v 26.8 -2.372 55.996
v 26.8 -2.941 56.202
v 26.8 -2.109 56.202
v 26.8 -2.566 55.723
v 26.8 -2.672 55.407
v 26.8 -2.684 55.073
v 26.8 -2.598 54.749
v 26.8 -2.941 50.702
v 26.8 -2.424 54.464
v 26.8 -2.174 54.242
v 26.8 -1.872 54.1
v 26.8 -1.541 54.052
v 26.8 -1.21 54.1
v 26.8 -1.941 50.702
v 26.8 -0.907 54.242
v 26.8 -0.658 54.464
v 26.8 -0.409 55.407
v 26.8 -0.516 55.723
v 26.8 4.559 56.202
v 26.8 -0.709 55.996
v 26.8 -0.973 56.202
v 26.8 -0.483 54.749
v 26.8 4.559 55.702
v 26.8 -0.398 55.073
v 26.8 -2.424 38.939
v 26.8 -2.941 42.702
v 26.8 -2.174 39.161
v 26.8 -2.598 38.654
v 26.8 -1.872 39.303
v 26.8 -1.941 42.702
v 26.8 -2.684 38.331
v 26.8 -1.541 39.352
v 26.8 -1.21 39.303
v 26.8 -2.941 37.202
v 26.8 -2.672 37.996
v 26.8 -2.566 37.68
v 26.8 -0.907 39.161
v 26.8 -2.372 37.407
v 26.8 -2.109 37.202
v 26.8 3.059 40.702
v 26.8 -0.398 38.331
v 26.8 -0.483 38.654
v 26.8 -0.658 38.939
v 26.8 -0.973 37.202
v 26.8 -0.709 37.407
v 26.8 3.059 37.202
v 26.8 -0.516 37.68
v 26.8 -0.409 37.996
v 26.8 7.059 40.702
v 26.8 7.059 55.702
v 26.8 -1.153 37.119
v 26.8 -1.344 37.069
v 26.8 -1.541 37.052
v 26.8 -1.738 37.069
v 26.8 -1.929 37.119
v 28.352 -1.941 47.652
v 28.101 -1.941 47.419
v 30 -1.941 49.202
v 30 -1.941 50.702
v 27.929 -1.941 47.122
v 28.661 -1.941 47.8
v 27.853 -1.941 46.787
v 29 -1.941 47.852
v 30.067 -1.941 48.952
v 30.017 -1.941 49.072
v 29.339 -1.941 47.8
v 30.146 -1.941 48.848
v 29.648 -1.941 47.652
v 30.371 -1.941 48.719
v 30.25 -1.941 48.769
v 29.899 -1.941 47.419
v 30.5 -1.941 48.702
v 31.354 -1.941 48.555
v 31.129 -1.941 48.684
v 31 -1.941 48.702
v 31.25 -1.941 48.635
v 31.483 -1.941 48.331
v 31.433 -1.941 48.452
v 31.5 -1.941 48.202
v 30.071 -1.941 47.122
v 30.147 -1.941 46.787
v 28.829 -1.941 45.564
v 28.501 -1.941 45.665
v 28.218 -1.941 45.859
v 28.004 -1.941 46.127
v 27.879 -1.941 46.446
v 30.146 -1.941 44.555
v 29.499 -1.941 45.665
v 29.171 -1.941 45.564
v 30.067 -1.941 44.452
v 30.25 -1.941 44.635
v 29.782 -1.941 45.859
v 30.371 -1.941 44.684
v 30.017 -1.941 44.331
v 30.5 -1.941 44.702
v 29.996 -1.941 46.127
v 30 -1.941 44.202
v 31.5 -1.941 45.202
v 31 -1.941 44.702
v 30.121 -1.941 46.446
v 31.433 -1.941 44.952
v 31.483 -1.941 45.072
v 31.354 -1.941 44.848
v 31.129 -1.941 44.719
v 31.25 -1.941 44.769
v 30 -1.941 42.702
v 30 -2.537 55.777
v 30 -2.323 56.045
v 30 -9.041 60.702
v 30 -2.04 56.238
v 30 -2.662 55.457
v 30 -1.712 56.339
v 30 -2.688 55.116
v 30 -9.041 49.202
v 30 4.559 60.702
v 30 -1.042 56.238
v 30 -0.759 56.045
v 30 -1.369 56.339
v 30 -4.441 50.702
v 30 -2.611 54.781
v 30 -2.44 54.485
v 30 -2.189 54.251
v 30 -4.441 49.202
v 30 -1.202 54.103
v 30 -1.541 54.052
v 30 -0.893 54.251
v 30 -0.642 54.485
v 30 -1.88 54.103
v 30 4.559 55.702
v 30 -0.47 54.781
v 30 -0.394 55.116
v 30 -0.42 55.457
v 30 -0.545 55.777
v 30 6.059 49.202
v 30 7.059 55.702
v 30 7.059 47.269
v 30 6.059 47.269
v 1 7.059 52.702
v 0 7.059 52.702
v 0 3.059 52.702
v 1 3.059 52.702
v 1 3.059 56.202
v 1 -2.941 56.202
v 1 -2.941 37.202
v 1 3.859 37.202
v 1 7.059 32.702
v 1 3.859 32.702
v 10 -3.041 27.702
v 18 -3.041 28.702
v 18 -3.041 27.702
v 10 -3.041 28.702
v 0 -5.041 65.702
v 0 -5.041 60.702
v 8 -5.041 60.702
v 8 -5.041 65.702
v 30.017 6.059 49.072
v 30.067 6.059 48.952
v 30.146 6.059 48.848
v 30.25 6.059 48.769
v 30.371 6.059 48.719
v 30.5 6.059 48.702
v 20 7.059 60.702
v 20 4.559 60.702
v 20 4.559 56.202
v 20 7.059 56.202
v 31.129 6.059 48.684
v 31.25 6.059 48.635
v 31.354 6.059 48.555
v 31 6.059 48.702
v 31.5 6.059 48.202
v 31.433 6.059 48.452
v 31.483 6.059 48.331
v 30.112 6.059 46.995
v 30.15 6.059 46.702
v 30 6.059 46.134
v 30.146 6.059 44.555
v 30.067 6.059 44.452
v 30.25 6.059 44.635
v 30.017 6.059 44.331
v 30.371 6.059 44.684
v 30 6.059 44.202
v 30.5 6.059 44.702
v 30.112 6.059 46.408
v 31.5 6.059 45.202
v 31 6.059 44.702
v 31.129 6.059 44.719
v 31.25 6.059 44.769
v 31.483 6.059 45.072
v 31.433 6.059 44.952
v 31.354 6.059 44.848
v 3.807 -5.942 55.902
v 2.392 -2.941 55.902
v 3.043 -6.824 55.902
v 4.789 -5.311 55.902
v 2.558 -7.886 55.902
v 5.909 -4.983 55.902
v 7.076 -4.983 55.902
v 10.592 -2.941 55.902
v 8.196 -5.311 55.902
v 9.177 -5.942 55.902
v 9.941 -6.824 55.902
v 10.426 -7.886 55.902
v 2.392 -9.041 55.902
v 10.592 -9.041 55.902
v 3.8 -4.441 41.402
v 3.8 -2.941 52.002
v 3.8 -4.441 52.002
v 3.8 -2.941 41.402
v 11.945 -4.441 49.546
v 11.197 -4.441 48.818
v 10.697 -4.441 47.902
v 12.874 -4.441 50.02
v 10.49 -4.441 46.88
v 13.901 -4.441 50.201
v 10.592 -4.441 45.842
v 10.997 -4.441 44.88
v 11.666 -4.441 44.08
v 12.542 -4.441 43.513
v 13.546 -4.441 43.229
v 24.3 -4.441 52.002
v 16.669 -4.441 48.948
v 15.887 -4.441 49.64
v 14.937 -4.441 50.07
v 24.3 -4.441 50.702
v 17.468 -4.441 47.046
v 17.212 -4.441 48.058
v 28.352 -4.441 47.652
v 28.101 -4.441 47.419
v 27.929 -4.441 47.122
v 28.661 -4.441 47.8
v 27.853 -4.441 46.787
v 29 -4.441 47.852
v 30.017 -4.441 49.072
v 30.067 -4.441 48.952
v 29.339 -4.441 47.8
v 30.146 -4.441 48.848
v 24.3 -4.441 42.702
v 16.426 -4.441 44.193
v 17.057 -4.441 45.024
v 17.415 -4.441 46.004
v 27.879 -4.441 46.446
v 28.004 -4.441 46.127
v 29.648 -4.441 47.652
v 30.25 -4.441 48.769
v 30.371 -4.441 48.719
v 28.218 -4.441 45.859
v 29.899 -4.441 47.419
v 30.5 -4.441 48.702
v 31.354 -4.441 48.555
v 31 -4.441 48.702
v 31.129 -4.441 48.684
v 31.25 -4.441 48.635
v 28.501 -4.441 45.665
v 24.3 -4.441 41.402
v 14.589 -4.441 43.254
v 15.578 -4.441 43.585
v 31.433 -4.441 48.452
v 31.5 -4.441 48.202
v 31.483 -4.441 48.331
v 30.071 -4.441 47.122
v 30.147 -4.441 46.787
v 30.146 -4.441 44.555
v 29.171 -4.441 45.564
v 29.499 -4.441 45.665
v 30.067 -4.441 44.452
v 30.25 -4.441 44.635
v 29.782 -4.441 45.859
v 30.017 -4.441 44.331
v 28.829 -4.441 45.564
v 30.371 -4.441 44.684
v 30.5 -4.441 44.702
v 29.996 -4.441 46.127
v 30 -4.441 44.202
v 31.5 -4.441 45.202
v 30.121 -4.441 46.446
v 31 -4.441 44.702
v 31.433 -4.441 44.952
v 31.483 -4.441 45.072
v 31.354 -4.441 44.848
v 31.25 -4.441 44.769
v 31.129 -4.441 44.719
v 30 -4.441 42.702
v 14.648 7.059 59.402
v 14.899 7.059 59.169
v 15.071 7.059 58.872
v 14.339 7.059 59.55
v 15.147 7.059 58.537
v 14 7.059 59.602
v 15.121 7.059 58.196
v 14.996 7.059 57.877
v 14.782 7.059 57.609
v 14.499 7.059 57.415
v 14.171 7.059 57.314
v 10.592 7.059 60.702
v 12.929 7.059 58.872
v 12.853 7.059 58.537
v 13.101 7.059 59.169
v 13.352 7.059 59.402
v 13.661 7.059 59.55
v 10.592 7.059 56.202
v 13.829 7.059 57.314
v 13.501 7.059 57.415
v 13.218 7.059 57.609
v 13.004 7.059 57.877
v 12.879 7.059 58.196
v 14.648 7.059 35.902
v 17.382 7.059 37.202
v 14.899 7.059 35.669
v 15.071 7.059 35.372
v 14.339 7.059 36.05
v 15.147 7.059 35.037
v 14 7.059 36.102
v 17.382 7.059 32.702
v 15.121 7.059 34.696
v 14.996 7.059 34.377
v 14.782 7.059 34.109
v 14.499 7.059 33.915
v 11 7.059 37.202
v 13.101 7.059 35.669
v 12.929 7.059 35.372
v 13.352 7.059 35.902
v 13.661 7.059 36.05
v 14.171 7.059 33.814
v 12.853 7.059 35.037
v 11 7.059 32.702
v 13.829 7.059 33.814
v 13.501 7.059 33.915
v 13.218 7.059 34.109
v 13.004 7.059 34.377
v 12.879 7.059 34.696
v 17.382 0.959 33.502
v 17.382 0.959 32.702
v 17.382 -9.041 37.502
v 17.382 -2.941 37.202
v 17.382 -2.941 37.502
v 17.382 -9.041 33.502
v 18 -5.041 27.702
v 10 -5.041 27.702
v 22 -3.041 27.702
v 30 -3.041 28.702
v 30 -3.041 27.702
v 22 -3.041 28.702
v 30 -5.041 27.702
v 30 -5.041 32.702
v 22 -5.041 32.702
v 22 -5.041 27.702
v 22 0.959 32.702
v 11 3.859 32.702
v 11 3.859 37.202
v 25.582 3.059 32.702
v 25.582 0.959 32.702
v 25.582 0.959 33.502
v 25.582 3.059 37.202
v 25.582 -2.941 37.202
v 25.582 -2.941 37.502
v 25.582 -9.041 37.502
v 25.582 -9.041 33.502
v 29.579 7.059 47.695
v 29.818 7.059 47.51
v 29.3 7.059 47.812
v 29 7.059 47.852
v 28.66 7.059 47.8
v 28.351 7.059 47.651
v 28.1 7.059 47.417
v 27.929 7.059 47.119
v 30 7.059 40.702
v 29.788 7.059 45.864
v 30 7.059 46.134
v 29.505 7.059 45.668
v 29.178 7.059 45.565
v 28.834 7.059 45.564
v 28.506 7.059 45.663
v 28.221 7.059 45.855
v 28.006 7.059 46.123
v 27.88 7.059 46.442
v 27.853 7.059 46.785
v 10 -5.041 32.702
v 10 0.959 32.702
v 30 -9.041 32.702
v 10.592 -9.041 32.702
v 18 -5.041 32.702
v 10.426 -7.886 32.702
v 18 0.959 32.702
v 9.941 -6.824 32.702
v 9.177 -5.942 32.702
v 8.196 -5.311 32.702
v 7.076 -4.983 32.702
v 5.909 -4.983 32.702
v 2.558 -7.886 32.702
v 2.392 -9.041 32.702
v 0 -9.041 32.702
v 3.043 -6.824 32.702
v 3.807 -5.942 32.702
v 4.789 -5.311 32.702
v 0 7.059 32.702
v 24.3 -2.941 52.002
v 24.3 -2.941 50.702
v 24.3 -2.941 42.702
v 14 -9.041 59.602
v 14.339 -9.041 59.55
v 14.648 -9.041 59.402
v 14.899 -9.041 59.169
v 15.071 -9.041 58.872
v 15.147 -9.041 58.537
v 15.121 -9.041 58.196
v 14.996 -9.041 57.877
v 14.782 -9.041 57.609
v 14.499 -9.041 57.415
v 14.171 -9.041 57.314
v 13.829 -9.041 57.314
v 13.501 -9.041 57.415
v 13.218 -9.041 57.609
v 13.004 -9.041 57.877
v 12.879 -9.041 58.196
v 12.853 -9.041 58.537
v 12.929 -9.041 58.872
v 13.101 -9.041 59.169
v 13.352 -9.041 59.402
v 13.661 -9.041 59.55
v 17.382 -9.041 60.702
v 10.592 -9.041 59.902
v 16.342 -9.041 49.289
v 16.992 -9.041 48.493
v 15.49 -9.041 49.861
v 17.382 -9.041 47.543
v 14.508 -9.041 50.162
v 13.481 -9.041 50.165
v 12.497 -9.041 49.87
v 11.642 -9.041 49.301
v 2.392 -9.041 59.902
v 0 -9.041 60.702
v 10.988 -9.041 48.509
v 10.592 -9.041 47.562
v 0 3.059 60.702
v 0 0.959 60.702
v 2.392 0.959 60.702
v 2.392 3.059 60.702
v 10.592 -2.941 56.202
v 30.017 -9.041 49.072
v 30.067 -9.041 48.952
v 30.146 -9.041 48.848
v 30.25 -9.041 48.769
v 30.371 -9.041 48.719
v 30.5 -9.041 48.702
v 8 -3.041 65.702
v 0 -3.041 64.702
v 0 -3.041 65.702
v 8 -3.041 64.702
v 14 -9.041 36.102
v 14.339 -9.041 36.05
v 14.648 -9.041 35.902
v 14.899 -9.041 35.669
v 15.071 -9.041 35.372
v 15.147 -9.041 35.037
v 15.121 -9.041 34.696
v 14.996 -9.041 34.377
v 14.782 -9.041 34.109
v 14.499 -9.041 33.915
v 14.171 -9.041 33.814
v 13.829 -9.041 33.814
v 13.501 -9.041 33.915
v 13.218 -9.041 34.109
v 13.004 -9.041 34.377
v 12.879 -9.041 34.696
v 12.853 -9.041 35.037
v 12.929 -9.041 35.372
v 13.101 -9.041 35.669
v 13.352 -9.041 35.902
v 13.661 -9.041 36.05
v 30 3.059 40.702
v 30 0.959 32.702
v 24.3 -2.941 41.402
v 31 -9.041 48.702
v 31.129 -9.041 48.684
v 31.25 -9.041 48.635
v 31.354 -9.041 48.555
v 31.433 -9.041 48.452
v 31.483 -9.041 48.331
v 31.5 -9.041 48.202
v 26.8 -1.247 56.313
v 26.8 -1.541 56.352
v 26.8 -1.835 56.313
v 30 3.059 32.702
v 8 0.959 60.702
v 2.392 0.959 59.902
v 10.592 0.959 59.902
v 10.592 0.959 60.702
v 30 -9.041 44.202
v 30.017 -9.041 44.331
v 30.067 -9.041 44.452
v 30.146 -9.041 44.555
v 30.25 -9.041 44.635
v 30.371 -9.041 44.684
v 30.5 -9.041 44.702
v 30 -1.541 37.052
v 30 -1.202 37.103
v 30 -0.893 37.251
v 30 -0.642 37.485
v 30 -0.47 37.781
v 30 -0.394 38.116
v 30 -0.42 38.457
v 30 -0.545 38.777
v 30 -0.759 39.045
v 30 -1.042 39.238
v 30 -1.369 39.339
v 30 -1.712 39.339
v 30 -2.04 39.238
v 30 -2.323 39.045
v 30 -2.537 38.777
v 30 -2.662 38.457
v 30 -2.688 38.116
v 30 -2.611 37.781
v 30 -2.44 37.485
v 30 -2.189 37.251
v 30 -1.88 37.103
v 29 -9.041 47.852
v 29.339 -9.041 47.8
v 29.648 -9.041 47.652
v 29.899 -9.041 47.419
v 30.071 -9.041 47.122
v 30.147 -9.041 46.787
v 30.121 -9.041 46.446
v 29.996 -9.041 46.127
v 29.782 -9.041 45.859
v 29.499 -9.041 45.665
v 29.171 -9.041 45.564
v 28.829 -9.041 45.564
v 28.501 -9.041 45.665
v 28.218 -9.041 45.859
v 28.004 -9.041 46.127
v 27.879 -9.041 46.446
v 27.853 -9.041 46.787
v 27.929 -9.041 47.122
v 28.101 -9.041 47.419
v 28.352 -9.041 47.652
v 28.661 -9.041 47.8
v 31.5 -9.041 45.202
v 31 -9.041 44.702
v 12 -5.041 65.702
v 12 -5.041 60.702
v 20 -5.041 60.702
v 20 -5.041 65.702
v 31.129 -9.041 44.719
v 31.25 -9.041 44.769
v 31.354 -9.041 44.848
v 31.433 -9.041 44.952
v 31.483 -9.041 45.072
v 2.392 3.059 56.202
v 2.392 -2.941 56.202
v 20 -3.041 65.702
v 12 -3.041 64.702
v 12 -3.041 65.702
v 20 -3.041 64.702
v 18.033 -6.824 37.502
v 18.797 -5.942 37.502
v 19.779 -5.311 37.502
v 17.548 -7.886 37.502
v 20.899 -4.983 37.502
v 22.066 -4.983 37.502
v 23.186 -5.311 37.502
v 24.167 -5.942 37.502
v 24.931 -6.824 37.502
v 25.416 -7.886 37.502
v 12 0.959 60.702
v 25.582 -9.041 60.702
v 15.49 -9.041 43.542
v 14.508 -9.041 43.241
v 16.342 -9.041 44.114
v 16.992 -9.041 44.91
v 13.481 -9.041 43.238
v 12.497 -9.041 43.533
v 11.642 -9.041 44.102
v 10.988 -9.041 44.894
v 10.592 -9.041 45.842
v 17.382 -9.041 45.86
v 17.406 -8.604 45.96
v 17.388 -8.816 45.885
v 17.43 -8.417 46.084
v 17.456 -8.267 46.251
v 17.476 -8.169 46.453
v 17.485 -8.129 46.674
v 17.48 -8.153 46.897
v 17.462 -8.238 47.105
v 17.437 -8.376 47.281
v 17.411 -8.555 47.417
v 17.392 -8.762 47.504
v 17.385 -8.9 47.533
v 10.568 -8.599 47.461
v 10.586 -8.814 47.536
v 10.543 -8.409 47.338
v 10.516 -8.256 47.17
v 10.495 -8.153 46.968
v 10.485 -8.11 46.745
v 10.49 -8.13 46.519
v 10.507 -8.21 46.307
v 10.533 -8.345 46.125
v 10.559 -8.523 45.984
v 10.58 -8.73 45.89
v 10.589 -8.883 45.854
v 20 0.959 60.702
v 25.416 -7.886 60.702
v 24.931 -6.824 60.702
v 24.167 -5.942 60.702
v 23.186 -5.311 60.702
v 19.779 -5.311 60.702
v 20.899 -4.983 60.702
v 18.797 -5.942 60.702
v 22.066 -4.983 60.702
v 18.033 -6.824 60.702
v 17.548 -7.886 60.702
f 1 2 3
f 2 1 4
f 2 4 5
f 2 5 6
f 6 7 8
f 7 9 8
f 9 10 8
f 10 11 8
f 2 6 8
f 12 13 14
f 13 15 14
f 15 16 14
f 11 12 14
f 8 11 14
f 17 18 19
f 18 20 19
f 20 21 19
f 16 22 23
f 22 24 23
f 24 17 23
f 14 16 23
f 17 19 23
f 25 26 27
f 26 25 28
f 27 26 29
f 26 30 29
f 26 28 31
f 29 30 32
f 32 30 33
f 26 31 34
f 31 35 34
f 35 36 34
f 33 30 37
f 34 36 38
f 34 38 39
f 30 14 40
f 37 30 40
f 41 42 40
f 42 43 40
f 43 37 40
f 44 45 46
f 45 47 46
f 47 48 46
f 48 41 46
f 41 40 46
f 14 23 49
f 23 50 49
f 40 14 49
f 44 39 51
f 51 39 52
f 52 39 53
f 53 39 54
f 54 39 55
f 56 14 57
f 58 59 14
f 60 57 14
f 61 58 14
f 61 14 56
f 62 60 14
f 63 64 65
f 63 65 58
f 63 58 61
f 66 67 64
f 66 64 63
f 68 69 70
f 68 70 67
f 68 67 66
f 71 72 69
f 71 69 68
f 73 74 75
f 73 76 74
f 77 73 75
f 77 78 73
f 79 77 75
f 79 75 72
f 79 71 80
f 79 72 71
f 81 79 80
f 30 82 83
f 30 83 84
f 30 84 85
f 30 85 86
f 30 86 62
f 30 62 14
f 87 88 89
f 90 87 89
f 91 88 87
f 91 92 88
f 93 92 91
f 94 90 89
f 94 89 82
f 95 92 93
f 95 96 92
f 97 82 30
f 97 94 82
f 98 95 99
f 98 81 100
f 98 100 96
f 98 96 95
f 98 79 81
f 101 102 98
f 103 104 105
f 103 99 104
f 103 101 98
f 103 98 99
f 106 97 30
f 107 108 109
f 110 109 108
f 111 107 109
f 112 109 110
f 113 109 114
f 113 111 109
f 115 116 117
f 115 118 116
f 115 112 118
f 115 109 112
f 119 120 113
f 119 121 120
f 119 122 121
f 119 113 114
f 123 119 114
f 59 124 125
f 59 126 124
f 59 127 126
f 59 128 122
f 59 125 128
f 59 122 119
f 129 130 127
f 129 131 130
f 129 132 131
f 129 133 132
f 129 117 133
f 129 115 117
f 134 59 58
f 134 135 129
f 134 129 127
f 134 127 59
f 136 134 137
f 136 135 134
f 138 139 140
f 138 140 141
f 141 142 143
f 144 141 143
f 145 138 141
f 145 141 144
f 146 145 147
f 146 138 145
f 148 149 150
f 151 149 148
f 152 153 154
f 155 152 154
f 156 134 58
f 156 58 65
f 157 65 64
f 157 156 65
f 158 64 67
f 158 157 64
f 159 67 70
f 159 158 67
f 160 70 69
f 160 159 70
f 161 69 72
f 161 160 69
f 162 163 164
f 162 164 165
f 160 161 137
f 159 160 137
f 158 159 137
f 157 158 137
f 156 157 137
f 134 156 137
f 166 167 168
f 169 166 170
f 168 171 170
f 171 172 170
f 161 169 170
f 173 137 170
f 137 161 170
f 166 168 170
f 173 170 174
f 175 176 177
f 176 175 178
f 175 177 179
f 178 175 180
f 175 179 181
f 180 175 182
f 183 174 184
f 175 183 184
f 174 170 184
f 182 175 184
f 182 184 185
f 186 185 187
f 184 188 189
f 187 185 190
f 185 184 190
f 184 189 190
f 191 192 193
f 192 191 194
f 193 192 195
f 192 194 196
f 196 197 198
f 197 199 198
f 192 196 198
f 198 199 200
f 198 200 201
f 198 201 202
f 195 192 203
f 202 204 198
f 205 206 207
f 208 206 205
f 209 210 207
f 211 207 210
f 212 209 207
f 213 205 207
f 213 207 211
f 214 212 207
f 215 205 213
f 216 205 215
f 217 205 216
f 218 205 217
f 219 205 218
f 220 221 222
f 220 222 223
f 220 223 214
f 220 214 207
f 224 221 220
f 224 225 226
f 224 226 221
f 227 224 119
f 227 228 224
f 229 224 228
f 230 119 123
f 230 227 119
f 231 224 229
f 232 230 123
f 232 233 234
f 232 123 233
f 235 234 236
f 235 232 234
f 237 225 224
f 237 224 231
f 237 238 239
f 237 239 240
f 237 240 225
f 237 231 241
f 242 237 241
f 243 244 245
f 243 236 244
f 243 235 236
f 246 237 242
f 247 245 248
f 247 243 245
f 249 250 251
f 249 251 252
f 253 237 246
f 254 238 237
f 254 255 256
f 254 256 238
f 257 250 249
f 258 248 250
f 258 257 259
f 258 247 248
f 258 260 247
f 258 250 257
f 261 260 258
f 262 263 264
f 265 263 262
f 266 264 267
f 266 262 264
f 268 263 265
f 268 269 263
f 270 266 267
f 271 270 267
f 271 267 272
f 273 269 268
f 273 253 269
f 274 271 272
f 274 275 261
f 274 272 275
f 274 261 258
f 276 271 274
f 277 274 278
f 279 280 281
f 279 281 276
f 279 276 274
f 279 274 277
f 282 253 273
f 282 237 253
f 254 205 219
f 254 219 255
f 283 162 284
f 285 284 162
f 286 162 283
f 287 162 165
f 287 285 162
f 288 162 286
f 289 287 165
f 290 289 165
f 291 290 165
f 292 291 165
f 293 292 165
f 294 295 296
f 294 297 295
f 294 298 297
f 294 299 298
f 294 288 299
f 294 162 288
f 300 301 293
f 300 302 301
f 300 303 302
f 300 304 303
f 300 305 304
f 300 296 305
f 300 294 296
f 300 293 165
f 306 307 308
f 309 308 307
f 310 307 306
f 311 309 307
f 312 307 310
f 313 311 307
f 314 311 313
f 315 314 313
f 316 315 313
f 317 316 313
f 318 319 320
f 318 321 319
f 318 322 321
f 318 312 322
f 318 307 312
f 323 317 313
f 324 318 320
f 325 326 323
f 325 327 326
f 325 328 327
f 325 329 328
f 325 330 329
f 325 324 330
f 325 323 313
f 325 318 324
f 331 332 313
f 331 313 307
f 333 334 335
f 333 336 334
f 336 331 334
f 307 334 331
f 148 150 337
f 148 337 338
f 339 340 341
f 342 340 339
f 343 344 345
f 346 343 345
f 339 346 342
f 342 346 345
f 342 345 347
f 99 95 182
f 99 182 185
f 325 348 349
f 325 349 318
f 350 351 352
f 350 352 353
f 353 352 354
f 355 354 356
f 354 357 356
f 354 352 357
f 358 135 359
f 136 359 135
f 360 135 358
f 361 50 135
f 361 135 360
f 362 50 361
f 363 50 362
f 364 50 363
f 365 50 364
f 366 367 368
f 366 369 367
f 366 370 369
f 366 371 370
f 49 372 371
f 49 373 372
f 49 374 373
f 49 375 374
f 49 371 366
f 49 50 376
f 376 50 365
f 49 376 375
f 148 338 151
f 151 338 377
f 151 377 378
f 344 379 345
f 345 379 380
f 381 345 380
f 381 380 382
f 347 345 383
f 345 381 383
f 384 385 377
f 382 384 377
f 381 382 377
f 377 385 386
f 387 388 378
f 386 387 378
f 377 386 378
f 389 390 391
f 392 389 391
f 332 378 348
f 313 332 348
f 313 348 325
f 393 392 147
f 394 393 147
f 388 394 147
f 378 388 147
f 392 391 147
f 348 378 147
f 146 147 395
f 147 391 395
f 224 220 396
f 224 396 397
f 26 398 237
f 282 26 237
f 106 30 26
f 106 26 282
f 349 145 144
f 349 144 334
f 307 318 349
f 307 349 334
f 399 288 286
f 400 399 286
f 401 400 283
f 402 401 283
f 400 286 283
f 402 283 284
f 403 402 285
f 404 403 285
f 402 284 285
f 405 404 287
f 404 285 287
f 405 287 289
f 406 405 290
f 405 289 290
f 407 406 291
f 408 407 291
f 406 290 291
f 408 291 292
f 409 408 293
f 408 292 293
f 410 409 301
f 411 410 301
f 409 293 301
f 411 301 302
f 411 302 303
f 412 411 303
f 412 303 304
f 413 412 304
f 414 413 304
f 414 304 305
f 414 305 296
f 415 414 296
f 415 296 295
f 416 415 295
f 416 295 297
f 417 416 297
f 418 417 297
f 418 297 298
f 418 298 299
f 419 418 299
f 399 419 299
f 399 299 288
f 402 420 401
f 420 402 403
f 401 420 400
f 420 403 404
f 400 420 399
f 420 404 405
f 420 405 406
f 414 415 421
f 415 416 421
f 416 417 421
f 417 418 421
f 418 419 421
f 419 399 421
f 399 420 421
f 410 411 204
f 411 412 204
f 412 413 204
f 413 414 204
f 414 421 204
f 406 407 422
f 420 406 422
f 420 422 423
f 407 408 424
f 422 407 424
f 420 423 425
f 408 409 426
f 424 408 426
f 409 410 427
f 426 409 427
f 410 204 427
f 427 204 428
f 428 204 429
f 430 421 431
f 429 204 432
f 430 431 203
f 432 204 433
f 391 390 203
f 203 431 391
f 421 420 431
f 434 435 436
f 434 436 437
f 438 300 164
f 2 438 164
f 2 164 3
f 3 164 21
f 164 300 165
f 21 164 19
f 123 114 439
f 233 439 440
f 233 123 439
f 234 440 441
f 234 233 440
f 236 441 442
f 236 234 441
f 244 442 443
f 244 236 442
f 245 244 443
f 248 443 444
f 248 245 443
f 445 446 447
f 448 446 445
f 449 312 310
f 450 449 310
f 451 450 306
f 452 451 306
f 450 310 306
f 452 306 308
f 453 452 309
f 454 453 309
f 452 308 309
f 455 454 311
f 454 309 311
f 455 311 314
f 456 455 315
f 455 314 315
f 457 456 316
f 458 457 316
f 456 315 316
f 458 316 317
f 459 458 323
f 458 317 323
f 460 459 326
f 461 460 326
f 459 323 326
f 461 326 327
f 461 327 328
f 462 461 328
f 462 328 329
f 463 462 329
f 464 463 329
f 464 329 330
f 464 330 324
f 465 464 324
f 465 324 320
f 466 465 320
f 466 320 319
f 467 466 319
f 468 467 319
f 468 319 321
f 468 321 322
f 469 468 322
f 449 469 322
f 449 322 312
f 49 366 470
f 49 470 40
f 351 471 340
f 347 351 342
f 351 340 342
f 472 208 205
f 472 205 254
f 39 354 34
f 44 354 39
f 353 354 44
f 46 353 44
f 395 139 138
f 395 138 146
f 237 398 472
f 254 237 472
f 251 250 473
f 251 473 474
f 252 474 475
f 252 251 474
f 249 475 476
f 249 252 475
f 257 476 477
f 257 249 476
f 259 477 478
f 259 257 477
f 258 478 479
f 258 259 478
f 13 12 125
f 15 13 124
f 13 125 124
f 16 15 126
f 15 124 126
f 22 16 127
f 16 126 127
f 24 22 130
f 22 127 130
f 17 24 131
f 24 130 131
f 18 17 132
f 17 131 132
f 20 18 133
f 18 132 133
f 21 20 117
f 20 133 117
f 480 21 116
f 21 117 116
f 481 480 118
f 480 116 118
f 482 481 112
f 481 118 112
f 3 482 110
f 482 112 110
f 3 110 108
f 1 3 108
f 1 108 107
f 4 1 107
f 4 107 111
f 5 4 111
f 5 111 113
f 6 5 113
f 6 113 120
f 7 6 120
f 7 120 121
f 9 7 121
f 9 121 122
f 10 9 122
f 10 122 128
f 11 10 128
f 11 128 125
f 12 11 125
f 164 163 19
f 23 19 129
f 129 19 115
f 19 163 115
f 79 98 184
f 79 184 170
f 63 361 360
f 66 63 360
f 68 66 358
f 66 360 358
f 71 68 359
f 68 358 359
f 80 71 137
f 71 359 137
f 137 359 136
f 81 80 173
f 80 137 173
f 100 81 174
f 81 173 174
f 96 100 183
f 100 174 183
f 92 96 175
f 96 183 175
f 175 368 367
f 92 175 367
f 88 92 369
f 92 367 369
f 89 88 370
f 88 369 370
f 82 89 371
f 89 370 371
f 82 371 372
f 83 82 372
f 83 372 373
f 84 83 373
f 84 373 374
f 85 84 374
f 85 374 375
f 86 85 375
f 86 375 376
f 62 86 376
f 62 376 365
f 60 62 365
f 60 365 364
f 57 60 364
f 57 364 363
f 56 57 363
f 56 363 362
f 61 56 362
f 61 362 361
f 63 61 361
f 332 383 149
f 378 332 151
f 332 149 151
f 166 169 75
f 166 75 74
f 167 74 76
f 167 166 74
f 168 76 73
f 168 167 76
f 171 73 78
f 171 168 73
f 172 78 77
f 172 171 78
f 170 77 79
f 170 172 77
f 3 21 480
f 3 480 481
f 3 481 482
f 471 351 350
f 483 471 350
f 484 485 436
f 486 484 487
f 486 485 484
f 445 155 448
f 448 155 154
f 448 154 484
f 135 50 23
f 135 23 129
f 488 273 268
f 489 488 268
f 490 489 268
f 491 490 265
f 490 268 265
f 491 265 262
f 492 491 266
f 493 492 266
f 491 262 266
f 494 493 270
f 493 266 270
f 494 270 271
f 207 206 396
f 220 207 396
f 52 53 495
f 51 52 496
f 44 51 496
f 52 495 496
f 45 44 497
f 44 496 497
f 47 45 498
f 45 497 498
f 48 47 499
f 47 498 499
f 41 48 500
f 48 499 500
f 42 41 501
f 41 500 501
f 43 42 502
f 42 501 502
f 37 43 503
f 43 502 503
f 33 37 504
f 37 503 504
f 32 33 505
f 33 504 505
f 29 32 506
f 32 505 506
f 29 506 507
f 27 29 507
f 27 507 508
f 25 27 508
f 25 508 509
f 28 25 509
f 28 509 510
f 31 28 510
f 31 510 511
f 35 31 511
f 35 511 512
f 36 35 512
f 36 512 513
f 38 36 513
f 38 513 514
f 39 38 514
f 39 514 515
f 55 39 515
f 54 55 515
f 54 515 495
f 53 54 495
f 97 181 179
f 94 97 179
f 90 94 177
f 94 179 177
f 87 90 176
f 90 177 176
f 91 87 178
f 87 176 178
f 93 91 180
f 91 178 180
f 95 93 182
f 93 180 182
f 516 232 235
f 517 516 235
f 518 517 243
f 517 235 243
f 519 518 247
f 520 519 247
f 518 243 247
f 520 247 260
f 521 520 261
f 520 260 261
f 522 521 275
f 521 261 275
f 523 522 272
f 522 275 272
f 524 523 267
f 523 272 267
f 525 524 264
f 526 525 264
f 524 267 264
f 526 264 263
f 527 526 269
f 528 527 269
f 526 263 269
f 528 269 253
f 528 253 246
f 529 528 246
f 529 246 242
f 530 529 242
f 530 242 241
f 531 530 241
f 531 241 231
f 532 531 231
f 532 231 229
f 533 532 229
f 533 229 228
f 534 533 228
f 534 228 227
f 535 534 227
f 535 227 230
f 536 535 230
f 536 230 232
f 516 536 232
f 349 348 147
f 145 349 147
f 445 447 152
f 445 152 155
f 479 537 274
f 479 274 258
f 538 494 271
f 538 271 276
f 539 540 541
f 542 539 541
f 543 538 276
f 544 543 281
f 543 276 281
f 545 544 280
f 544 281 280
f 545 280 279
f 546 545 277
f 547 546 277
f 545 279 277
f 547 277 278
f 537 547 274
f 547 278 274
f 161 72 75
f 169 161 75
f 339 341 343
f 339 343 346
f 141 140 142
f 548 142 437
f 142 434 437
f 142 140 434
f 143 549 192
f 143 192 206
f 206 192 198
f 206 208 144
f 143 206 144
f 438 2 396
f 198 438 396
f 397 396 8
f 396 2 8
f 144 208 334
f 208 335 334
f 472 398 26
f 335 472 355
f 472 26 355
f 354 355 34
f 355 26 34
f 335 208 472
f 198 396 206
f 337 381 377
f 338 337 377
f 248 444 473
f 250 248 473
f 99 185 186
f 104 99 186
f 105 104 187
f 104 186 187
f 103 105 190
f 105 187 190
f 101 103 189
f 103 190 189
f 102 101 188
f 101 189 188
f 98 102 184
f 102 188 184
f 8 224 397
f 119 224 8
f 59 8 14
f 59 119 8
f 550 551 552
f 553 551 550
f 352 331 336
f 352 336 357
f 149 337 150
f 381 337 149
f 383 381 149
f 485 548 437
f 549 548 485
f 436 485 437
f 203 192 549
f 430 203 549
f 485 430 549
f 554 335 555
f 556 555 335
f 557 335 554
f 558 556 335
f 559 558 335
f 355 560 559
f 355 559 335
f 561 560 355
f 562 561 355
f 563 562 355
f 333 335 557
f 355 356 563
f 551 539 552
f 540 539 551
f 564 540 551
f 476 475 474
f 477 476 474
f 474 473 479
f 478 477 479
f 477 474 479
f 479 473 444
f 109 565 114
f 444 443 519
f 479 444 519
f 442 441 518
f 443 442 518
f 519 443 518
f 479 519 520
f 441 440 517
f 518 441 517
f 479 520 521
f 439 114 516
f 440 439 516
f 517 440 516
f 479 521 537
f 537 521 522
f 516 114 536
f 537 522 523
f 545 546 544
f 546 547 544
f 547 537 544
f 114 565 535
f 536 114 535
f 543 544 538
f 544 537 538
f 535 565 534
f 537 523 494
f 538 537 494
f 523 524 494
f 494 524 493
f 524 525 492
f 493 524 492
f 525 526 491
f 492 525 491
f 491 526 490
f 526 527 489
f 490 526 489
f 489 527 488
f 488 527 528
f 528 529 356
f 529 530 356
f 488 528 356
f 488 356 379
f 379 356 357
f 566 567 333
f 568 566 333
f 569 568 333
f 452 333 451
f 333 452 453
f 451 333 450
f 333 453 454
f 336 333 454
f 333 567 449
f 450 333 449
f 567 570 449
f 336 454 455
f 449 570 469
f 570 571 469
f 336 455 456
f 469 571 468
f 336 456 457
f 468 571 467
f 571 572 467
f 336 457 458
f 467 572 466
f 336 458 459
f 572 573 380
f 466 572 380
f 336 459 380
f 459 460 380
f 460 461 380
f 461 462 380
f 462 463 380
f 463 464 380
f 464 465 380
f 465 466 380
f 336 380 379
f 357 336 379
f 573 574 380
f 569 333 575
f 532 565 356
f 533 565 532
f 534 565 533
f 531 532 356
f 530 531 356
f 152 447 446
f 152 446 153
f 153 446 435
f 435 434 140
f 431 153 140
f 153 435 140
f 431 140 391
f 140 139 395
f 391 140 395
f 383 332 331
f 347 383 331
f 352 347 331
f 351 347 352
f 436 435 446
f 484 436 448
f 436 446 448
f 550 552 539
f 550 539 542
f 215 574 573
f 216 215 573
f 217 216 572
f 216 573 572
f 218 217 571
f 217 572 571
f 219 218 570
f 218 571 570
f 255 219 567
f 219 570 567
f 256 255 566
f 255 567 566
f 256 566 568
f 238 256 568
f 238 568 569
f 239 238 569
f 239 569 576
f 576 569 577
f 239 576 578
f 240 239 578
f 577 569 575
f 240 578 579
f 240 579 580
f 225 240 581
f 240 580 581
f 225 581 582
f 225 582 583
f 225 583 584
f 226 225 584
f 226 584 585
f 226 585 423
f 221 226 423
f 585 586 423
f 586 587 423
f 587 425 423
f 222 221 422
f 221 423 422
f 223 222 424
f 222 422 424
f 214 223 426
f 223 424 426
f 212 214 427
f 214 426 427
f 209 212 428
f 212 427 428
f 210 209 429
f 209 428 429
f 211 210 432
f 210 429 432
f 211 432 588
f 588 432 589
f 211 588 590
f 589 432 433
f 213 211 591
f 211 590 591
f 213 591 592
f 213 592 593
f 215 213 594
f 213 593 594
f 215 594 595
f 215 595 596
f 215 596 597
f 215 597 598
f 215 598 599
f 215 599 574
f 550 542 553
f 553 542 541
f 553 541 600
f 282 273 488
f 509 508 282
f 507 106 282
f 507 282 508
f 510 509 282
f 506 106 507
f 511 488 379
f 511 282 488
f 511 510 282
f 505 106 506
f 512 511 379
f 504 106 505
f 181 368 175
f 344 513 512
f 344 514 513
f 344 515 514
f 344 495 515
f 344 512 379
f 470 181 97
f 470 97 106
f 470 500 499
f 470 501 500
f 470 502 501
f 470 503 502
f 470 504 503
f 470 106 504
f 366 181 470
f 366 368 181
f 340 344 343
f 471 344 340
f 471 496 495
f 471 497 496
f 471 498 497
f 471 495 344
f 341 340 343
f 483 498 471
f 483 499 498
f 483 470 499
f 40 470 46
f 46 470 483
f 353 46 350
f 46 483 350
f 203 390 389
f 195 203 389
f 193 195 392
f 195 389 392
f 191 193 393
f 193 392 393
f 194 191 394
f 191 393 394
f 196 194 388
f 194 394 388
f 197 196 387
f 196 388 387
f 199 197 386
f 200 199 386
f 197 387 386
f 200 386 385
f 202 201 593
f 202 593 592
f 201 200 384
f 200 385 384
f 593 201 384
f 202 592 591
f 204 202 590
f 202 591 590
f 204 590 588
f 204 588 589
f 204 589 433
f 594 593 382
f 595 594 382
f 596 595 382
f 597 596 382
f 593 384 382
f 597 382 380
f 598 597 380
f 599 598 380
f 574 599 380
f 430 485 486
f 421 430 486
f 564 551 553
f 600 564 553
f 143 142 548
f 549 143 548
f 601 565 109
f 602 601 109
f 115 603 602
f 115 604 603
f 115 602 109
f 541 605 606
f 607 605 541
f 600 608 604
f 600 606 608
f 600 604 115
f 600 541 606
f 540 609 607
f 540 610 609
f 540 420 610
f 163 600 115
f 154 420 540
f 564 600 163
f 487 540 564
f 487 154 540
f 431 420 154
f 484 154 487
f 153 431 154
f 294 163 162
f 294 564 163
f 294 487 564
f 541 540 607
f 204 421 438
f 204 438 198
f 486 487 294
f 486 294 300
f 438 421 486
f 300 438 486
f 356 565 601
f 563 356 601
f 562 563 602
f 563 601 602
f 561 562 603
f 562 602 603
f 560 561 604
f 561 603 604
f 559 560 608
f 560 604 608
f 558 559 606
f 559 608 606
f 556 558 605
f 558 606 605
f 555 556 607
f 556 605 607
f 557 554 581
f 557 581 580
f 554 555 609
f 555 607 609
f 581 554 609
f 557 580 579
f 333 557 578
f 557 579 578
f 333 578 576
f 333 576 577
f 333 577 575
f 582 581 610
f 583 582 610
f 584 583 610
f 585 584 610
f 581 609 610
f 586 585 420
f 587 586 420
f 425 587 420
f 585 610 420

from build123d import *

# Parameters (mm, degrees)
SKETCH1_W           = 28
SKETCH1_H           = 16.1
BOSS_EXTRUDE1_DEPTH = 30
SKETCH2_W           = 10
SKETCH2_H           = 2.5
CUT_EXTRUDE1_DEPTH  = 5
SKETCH3_W           = 10
SKETCH3_H           = 4
CUT_EXTRUDE2_DEPTH  = 8
SKETCH4_W           = 10
SKETCH4_H           = 3.2
CUT_EXTRUDE3_DEPTH  = 8
SKETCH5_W           = 11
SKETCH5_H           = 4
CUT_EXTRUDE4_DEPTH  = 8
SKETCH6_W           = 20
SKETCH6_H           = 2
BOSS_EXTRUDE2_DEPTH = 5
CHAMFER1_SIZE       = 4
SKETCH7_W           = 20
SKETCH7_H           = 2
BOSS_EXTRUDE3_DEPTH = 5
CHAMFER2_SIZE       = 4
SKETCH9_W           = 25.8
SKETCH9_H           = 19
CUT_EXTRUDE6_DEPTH  = 10
SKETCH13_R          = 4.1
CUT_EXTRUDE10_DEPTH = 27.2
SKETCH14_R          = 4.1
CUT_EXTRUDE11_DEPTH = 27.2
SKETCH15_W          = 8.2
SKETCH15_H          = 4
CUT_EXTRUDE12_DEPTH = 27.2
SKETCH16_W          = 0.59230819
SKETCH16_H          = 0.8
SKETCH16_W_2        = 1.617695922
CUT_EXTRUDE13_DEPTH = 4
SKETCH17_W          = 1.5
SKETCH17_H          = 4
BOSS_EXTRUDE4_DEPTH = 16.1
FILLET1_R           = 0.5
SKETCH18_R          = 3.5
CUT_EXTRUDE14_DEPTH = 6.1
SKETCH19_W          = 8
SKETCH19_H          = 1
CUT_EXTRUDE15_DEPTH = 10
SKETCH20_W          = 20.5
SKETCH20_H          = 10.6
CUT_EXTRUDE16_DEPTH = 1.5
SKETCH21_W          = 5.7
SKETCH21_H          = 8
CUT_EXTRUDE17_DEPTH = 1.5
SKETCH22_W          = 8
SKETCH22_H          = 2.5
CUT_EXTRUDE18_DEPTH = 1.5
SKETCH23_R          = 1.15
CUT_EXTRUDE19_DEPTH = 75.620049118
SKETCH24_W          = 8.2
SKETCH24_H          = 0.8
CUT_EXTRUDE20_DEPTH = 2.1
CUT_EXTRUDE21_REACH = 75.421
SKETCH25_W          = 7.929527271
SKETCH25_H          = 1
CUT_EXTRUDE22_START = -5
SKETCH26_W          = 4
SKETCH26_H          = 6
CUT_EXTRUDE22_DEPTH = 5
CUT_EXTRUDE23_START = -5
SKETCH27_W          = 4
SKETCH27_H          = 6
CUT_EXTRUDE23_DEPTH = 5
SKETCH28_R          = 1.15
CUT_EXTRUDE24_DEPTH = 3.2


with BuildPart() as part:
    # Sketch1 → Boss-Extrude1 (new body)
    with BuildSketch(Plane(origin=(0, 0, 0), x_dir=(0, 0, -1), z_dir=(1, 0, 0))):
        with Locations((-46.701535197, -0.990821865)):
            Rectangle(SKETCH1_W, SKETCH1_H)
    extrude(amount=BOSS_EXTRUDE1_DEPTH)

    # Sketch2 → Cut-Extrude1 (cut)
    with BuildSketch(Plane.XY.offset(60.701535197)):
        with Locations((25, 5.809178135)):
            Rectangle(SKETCH2_W, SKETCH2_H)
    extrude(amount=-CUT_EXTRUDE1_DEPTH, mode=Mode.SUBTRACT)

    # Sketch3 → Cut-Extrude2 (cut)
    with BuildSketch(Plane.XY.offset(60.701535197)):
        with Locations((5, 5.059178135)):
            Rectangle(SKETCH3_W, SKETCH3_H)
    extrude(amount=-CUT_EXTRUDE2_DEPTH, mode=Mode.SUBTRACT)

    # Sketch4 → Cut-Extrude3 (cut)
    with BuildSketch(Plane(origin=(0, 0, 32.701535197), x_dir=(-1, 0, 0), z_dir=(0, 0, -1))):
        with Locations((-6, 5.459178135)):
            Rectangle(SKETCH4_W, SKETCH4_H)
    extrude(amount=-CUT_EXTRUDE3_DEPTH, mode=Mode.SUBTRACT)

    # Sketch5 → Cut-Extrude4 (cut)
    with BuildSketch(Plane(origin=(0, 0, 32.701535197), x_dir=(-1, 0, 0), z_dir=(0, 0, -1))):
        with Locations((-24.5, 5.059178135)):
            Rectangle(SKETCH5_W, SKETCH5_H)
    extrude(amount=-CUT_EXTRUDE4_DEPTH, mode=Mode.SUBTRACT)

    # Sketch6 → Boss-Extrude2 (add)
    with BuildSketch(Plane(origin=(0, 0, 32.701535197), x_dir=(-1, 0, 0), z_dir=(0, 0, -1))):
        with Locations((-20, -4.040821865)):
            Rectangle(SKETCH6_W, SKETCH6_H)
    extrude(amount=BOSS_EXTRUDE2_DEPTH)

    # Chamfer1
    chamfer1_edges = [part.edges().sort_by_distance(p)[0] for p in [
        (20, -3.040821865, 32.701535197),
    ]]
    chamfer(chamfer1_edges, length=CHAMFER1_SIZE)

    # Sketch7 → Boss-Extrude3 (add)
    with BuildSketch(Plane.XY.offset(60.701535197)):
        with Locations((10, -4.040821865)):
            Rectangle(SKETCH7_W, SKETCH7_H)
    extrude(amount=BOSS_EXTRUDE3_DEPTH)

    # Chamfer2
    chamfer2_edges = [part.edges().sort_by_distance(p)[0] for p in [
        (10, -3.040821865, 60.701535197),
    ]]
    chamfer(chamfer2_edges, length=CHAMFER2_SIZE)

    # Sketch9 → Cut-Extrude6 (cut)
    with BuildSketch(Plane(origin=(0, 7.059178135, 0), x_dir=(1, 0, 0), z_dir=(0, 1, 0))):
        with Locations((13.9, -46.701535197)):
            Rectangle(SKETCH9_W, SKETCH9_H)
    extrude(amount=-CUT_EXTRUDE6_DEPTH, mode=Mode.SUBTRACT)

    # Sketch13 → Cut-Extrude10 (cut)
    with BuildSketch(Plane.XY.offset(60.701535197)):
        with Locations((21.482304078, -9.040821865)):
            Circle(SKETCH13_R)
    extrude(amount=-CUT_EXTRUDE10_DEPTH, mode=Mode.SUBTRACT)

    # Sketch14 → Cut-Extrude11 (cut)
    with BuildSketch(Plane(origin=(0, 0, 32.701535197), x_dir=(-1, 0, 0), z_dir=(0, 0, -1))):
        with Locations((-6.49230819, -9.040821865)):
            Circle(SKETCH14_R)
    extrude(amount=-CUT_EXTRUDE11_DEPTH, mode=Mode.SUBTRACT)

    # Sketch15 → Cut-Extrude12 (cut)
    with BuildSketch(Plane.XZ.offset(9.040821865)):
        with Locations((6.49230819, 57.901535197)):
            Rectangle(SKETCH15_W, SKETCH15_H)
        with Locations((21.482304078, 35.501535197)):
            Rectangle(SKETCH15_W, SKETCH15_H)
    extrude(amount=-CUT_EXTRUDE12_DEPTH, mode=Mode.SUBTRACT)

    # Sketch16 → Cut-Extrude13 (cut)
    with BuildSketch(Plane(origin=(0, 7.059178135, 0), x_dir=(1, 0, 0), z_dir=(0, 1, 0))):
        with Locations((10.296154095, -60.301535197)):
            Rectangle(SKETCH16_W, SKETCH16_H)
        with Locations((18.191152039, -33.101535197)):
            Rectangle(SKETCH16_W_2, SKETCH16_H)
    extrude(amount=-CUT_EXTRUDE13_DEPTH, mode=Mode.SUBTRACT)

    # Sketch17 → Boss-Extrude4 (add)
    with BuildSketch(Plane.XZ.offset(9.040821865)):
        with Locations((30.75, 46.701535197)):
            Rectangle(SKETCH17_W, SKETCH17_H)
    extrude(amount=-BOSS_EXTRUDE4_DEPTH)

    # Fillet1
    fillet1_edges = [part.edges().sort_by_distance(p)[0] for p in [
        (30, -0.990821865, 44.701535197),
        (30, -0.990821865, 48.701535197),
        (31.5, -0.990821865, 48.701535197),
        (31.5, -0.990821865, 44.701535197),
    ]]
    fillet(fillet1_edges, radius=FILLET1_R)

    # Sketch18 → Cut-Extrude14 (cut)
    with BuildSketch(Plane.XZ.offset(9.040821865)):
        with Locations(Location((13.985, 46.701535197, 0), (0, 0, 194.224464848))):
            Circle(SKETCH18_R)
    extrude(amount=-CUT_EXTRUDE14_DEPTH, mode=Mode.SUBTRACT)

    # Sketch19 → Cut-Extrude15 (cut)
    with BuildSketch(Plane(origin=(31.5, 0, 0), x_dir=(0, 0, -1), z_dir=(1, 0, 0))):
        with Locations((-46.701535197, -2.440821865)):
            Rectangle(SKETCH19_W, SKETCH19_H)
    extrude(amount=-CUT_EXTRUDE15_DEPTH, mode=Mode.SUBTRACT)

    # Sketch20 → Cut-Extrude16 (cut)
    with BuildSketch(Plane(origin=(0, -2.940821865, 0), x_dir=(1, 0, 0), z_dir=(0, 1, 0))):
        with Locations((14.05, -46.701535197)):
            Rectangle(SKETCH20_W, SKETCH20_H)
    extrude(amount=-CUT_EXTRUDE16_DEPTH, mode=Mode.SUBTRACT)

    # Sketch21 → Cut-Extrude17 (cut)
    with BuildSketch(Plane(origin=(0, -2.940821865, 0), x_dir=(1, 0, 0), z_dir=(0, 1, 0))):
        with Locations((27.15, -46.701535197)):
            Rectangle(SKETCH21_W, SKETCH21_H)
    extrude(amount=-CUT_EXTRUDE17_DEPTH, mode=Mode.SUBTRACT)

    # Sketch22 → Cut-Extrude18 (cut)
    with BuildSketch(Plane(origin=(31.5, 0, 0), x_dir=(0, 0, -1), z_dir=(1, 0, 0))):
        with Locations((-46.701535197, -3.190821865)):
            Rectangle(SKETCH22_W, SKETCH22_H)
    extrude(amount=-CUT_EXTRUDE18_DEPTH, mode=Mode.SUBTRACT)

    # Sketch23 → Cut-Extrude19 (cut, through all)
    with BuildSketch(Plane(origin=(0, 7.059178135, 0), x_dir=(1, 0, 0), z_dir=(0, 1, 0))):
        with Locations(Location((29, -46.701535197, 0), (0, 0, 270))):
            Circle(SKETCH23_R)
        with Locations(Location((14, -34.951535197, 0), (0, 0, 270))):
            Circle(SKETCH23_R)
        with Locations(Location((14, -58.451535197, 0), (0, 0, 270))):
            Circle(SKETCH23_R)
    extrude(amount=-CUT_EXTRUDE19_DEPTH, mode=Mode.SUBTRACT)

    # Sketch24 → Cut-Extrude20 (cut)
    with BuildSketch(Plane(origin=(0, 3.059178135, 0), x_dir=(1, 0, 0), z_dir=(0, 1, 0))):
        with Locations((21.482304078, -33.101535197)):
            Rectangle(SKETCH24_W, SKETCH24_H)
        with Locations((6.49230819, -60.301535197)):
            Rectangle(SKETCH24_W, SKETCH24_H)
    extrude(amount=-CUT_EXTRUDE20_DEPTH, mode=Mode.SUBTRACT)

    # Cut-Extrude21: up to this face of the body (flat: up to its plane)
    cut_extrude21_end = Plane(part.part.faces().sort_by_distance((30, -1.445232759, 54.822020691))[0])
    # Sketch25 → Cut-Extrude21 (cut, up to the picked face)
    with BuildSketch(Plane(origin=(31.5, 0, 0), x_dir=(0, 0, -1), z_dir=(1, 0, 0)), mode=Mode.PRIVATE) as cut_extrude21_sk1:
        with Locations((-46.553400254, 6.559178135)):
            Rectangle(SKETCH25_W, SKETCH25_H)
    cut_extrude21_tool1 = split(extrude(cut_extrude21_sk1.sketch, amount=-CUT_EXTRUDE21_REACH, mode=Mode.PRIVATE), bisect_by=cut_extrude21_end, keep=Keep.BOTH, mode=Mode.PRIVATE)
    add(cut_extrude21_tool1.solids().sort_by(Axis((31.5, 6.559178, 46.5534), (-1, 0, 0)))[0], mode=Mode.SUBTRACT)

    # Sketch26 → Cut-Extrude22 (cut)
    with BuildSketch(Plane.XY.offset(65.701535197).offset(CUT_EXTRUDE22_START)):
        with Locations((10, -2.040821865)):
            Rectangle(SKETCH26_W, SKETCH26_H)
    extrude(amount=CUT_EXTRUDE22_DEPTH, mode=Mode.SUBTRACT)

    # Sketch27 → Cut-Extrude23 (cut)
    with BuildSketch(Plane(origin=(0, 0, 27.701535197), x_dir=(-1, 0, 0), z_dir=(0, 0, -1)).offset(CUT_EXTRUDE23_START)):
        with Locations((-20, -2.040821865)):
            Rectangle(SKETCH27_W, SKETCH27_H)
    extrude(amount=CUT_EXTRUDE23_DEPTH, mode=Mode.SUBTRACT)

    # Sketch28 → Cut-Extrude24 (cut)
    with BuildSketch(Plane(origin=(30, 0, 0), x_dir=(0, 0, -1), z_dir=(1, 0, 0))):
        with Locations((-55.201535197, -1.540821865)):
            Circle(SKETCH28_R)
        with Locations((-38.201535197, -1.540821865)):
            Circle(SKETCH28_R)
    extrude(amount=-CUT_EXTRUDE24_DEPTH, mode=Mode.SUBTRACT)


solid = part.part
